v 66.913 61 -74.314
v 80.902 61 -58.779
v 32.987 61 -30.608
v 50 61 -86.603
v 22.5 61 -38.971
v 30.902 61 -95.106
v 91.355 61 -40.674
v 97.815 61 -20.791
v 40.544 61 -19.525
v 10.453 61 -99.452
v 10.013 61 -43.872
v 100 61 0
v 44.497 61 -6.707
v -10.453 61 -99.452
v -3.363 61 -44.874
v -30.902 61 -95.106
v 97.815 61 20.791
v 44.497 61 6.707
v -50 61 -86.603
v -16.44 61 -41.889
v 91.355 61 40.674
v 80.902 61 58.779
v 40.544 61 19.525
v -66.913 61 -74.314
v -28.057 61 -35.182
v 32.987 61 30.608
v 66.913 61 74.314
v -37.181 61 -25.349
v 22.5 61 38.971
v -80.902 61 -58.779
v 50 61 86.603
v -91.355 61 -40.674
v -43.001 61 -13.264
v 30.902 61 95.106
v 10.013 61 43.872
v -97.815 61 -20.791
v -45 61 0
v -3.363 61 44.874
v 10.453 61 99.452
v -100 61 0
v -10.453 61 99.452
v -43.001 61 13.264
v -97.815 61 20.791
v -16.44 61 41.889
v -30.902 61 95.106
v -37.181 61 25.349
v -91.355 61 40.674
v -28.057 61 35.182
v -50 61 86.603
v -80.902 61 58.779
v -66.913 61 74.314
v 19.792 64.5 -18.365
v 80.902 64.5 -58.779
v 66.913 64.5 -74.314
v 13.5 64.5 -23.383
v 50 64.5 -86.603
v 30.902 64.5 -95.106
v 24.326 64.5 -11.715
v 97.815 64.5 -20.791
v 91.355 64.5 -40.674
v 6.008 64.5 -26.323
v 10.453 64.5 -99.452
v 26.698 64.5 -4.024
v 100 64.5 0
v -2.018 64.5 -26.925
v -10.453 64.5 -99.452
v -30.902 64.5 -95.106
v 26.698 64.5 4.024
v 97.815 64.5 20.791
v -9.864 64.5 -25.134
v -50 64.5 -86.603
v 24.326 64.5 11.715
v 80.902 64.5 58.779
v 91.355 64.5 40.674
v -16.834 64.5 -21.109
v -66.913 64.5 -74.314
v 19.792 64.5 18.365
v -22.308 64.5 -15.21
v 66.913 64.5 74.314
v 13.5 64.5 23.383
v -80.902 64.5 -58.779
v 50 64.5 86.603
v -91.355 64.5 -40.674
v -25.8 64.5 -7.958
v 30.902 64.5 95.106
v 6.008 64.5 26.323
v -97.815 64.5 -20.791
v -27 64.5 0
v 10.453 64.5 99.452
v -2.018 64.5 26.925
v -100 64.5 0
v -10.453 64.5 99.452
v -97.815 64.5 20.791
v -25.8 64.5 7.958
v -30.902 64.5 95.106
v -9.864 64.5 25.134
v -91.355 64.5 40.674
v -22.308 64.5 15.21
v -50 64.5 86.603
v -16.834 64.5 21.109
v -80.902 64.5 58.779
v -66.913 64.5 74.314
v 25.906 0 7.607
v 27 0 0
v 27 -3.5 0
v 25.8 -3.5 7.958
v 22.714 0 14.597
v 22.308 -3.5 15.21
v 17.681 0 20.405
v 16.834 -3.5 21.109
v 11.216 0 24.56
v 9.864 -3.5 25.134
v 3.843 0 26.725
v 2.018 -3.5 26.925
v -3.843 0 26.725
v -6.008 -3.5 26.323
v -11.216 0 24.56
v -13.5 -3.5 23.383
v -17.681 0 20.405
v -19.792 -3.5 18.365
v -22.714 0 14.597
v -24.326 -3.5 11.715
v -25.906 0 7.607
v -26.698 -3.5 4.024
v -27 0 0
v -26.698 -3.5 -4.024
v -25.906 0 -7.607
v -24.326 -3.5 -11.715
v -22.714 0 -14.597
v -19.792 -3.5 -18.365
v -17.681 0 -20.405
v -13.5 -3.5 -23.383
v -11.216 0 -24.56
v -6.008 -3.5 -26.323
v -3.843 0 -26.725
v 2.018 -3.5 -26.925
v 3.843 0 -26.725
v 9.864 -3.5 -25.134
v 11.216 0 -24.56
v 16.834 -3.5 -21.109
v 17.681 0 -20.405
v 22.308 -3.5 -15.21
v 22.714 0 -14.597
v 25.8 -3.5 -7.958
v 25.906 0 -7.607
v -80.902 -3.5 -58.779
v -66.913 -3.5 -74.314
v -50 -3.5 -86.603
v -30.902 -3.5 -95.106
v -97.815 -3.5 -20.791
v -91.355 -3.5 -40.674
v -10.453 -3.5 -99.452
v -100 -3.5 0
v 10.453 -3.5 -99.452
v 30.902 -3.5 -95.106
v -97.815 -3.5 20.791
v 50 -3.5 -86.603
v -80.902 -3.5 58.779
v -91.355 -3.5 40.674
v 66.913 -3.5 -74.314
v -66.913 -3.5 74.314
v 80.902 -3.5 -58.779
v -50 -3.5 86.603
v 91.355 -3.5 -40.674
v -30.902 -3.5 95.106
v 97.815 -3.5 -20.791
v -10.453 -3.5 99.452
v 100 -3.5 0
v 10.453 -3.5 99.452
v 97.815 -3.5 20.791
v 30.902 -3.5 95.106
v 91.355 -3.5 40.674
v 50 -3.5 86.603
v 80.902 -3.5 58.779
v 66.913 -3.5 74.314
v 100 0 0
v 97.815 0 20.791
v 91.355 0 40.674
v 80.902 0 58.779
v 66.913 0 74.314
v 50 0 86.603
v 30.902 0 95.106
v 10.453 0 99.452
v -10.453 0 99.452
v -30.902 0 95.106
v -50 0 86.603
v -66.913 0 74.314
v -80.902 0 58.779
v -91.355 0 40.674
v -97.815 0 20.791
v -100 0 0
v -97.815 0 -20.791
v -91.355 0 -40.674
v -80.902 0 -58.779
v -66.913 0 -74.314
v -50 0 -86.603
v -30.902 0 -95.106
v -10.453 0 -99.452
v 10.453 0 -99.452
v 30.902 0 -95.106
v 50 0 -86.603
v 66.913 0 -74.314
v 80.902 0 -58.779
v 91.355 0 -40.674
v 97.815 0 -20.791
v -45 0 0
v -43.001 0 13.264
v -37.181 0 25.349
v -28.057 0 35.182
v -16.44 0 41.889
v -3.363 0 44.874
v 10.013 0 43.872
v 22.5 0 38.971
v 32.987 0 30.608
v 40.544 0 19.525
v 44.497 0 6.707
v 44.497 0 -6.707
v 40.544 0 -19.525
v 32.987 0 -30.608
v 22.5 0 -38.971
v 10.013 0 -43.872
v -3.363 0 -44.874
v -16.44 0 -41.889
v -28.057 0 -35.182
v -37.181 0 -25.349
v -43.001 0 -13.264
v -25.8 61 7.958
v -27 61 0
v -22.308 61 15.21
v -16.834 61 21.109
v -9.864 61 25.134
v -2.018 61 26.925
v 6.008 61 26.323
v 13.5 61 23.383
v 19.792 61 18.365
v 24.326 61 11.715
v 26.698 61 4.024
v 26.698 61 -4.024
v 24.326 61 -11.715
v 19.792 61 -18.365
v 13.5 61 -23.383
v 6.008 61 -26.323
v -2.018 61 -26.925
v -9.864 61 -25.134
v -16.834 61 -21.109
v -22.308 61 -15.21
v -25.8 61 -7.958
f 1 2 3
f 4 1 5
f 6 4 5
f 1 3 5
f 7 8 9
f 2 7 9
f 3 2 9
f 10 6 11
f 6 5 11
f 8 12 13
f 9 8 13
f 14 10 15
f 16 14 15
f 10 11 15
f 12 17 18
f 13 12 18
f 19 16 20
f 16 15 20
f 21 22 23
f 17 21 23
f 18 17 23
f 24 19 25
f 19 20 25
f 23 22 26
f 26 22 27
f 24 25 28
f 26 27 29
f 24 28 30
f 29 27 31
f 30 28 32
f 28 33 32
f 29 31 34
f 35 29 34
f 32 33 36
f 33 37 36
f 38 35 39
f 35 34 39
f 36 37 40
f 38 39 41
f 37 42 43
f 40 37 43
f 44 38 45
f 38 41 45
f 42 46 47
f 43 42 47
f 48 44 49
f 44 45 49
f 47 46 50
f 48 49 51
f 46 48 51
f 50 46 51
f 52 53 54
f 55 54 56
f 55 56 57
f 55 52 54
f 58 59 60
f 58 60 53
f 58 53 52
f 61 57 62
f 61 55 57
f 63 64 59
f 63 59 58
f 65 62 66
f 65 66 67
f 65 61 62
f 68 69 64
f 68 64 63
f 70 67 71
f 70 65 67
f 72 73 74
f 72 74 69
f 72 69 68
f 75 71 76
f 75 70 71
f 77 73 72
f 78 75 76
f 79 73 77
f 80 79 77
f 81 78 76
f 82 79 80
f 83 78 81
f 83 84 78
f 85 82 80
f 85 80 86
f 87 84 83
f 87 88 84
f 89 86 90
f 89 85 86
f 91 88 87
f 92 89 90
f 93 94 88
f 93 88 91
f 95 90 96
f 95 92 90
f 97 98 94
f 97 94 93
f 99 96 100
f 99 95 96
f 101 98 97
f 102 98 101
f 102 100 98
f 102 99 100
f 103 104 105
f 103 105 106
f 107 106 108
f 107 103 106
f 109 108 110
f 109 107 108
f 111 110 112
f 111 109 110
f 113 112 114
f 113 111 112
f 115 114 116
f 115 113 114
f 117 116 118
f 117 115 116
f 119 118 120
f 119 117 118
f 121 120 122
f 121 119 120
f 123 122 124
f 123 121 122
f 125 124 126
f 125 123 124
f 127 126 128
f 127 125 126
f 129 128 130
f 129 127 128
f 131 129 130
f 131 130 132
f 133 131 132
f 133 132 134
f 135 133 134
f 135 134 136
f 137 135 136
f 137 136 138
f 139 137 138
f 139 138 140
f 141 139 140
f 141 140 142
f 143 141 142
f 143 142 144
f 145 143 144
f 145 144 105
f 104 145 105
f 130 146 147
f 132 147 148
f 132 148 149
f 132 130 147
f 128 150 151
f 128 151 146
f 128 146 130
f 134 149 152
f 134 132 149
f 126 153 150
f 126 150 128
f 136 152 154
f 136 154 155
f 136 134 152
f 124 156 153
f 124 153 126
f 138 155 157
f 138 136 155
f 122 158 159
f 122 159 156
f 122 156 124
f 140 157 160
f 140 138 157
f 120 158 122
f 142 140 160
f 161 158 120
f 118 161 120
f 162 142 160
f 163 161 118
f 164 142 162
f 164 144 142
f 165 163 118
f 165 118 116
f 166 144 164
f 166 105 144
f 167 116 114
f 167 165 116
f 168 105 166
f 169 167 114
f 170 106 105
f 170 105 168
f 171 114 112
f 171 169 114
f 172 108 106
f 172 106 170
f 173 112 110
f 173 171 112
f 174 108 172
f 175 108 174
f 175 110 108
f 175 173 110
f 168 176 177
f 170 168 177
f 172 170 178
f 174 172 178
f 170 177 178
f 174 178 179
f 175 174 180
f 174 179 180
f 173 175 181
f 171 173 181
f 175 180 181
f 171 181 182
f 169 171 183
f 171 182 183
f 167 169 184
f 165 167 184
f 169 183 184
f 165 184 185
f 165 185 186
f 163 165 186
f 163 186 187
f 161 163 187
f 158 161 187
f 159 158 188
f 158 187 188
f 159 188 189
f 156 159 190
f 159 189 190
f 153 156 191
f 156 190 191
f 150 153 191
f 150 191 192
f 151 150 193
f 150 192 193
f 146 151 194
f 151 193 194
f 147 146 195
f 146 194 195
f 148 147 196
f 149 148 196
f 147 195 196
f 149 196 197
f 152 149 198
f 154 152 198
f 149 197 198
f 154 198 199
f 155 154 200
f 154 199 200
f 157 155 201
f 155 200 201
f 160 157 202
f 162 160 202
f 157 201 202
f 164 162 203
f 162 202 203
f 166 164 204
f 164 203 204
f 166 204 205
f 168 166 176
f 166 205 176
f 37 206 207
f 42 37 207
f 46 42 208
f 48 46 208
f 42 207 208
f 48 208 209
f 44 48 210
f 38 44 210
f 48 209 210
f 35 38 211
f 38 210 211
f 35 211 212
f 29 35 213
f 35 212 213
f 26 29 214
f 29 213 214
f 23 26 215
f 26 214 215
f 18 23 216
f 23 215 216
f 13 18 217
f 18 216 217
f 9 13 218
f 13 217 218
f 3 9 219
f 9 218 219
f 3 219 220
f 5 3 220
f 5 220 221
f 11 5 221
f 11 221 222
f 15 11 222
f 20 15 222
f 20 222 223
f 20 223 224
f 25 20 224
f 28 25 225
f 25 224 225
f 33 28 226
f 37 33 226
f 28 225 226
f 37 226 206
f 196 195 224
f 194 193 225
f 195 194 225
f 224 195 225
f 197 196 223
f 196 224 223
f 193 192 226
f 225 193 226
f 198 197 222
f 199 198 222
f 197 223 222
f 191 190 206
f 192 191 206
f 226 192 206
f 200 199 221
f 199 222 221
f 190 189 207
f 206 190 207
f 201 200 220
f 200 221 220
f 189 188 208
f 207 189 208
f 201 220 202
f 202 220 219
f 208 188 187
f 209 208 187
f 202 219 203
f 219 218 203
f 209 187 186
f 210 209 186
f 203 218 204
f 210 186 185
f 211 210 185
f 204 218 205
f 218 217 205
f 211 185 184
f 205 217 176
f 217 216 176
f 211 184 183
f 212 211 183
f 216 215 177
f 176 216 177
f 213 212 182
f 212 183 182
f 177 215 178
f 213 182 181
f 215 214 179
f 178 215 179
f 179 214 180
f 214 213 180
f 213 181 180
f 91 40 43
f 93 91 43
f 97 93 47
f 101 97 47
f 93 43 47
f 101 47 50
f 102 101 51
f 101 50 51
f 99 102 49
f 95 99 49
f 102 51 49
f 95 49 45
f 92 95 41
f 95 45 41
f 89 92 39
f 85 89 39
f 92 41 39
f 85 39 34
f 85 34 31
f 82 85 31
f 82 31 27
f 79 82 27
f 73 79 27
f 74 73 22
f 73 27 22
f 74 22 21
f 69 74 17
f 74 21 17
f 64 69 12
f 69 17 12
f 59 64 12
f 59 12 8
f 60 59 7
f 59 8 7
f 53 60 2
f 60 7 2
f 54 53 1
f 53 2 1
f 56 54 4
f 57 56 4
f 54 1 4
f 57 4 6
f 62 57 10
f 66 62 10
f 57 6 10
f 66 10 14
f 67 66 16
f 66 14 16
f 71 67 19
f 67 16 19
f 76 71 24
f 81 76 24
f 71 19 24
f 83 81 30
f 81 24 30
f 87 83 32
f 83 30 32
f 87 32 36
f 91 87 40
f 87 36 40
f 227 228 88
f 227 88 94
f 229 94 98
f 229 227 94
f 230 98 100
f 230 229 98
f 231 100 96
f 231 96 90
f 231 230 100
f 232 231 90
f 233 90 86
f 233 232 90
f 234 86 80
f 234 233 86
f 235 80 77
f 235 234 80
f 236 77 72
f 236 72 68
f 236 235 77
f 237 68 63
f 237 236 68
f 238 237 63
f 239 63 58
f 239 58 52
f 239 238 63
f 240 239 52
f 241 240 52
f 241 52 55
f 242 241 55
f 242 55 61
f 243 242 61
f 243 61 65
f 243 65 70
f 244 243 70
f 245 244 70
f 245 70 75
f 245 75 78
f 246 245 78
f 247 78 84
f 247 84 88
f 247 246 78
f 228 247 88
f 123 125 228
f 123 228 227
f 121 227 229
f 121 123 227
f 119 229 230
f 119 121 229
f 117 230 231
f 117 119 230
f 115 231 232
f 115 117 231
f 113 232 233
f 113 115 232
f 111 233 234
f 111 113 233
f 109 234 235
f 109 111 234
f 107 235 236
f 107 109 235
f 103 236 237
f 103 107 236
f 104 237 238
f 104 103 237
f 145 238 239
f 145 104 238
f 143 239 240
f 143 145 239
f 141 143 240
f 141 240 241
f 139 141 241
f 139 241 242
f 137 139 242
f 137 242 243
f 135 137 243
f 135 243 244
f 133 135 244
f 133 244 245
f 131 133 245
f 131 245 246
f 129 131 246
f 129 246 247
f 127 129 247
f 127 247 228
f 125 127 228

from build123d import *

# Parameters (mm, degrees)
F0_R     = 100
F0_R_2   = 27
F1_DEPTH = 3.5
F2_R     = 45
F2_R_2   = 27
F3_DEPTH = 61
F4_R     = 100
F4_R_2   = 27
F5_DEPTH = 3.5


with BuildPart() as f1:
    # F0 (on Front) → F1 (new body)
    with BuildSketch(Plane.XZ):
        Circle(F0_R)
        Circle(F0_R_2, mode=Mode.SUBTRACT)
    extrude(amount=F1_DEPTH)

    # F2 (on face) → F3 (join)
    with BuildSketch(Plane(origin=(0, 0, 0), x_dir=(-1, 0, 0), z_dir=(0, 1, 0))):
        Circle(F2_R)
        Circle(F2_R_2, mode=Mode.SUBTRACT)
    extrude(amount=F3_DEPTH)

    # F4 (on face) → F5 (join)
    with BuildSketch(Plane(origin=(0, 61, 0), x_dir=(-1, 0, 0), z_dir=(0, 1, 0))):
        Circle(F4_R)
        Circle(F4_R_2, mode=Mode.SUBTRACT)
    extrude(amount=F5_DEPTH)


solid = f1.part
